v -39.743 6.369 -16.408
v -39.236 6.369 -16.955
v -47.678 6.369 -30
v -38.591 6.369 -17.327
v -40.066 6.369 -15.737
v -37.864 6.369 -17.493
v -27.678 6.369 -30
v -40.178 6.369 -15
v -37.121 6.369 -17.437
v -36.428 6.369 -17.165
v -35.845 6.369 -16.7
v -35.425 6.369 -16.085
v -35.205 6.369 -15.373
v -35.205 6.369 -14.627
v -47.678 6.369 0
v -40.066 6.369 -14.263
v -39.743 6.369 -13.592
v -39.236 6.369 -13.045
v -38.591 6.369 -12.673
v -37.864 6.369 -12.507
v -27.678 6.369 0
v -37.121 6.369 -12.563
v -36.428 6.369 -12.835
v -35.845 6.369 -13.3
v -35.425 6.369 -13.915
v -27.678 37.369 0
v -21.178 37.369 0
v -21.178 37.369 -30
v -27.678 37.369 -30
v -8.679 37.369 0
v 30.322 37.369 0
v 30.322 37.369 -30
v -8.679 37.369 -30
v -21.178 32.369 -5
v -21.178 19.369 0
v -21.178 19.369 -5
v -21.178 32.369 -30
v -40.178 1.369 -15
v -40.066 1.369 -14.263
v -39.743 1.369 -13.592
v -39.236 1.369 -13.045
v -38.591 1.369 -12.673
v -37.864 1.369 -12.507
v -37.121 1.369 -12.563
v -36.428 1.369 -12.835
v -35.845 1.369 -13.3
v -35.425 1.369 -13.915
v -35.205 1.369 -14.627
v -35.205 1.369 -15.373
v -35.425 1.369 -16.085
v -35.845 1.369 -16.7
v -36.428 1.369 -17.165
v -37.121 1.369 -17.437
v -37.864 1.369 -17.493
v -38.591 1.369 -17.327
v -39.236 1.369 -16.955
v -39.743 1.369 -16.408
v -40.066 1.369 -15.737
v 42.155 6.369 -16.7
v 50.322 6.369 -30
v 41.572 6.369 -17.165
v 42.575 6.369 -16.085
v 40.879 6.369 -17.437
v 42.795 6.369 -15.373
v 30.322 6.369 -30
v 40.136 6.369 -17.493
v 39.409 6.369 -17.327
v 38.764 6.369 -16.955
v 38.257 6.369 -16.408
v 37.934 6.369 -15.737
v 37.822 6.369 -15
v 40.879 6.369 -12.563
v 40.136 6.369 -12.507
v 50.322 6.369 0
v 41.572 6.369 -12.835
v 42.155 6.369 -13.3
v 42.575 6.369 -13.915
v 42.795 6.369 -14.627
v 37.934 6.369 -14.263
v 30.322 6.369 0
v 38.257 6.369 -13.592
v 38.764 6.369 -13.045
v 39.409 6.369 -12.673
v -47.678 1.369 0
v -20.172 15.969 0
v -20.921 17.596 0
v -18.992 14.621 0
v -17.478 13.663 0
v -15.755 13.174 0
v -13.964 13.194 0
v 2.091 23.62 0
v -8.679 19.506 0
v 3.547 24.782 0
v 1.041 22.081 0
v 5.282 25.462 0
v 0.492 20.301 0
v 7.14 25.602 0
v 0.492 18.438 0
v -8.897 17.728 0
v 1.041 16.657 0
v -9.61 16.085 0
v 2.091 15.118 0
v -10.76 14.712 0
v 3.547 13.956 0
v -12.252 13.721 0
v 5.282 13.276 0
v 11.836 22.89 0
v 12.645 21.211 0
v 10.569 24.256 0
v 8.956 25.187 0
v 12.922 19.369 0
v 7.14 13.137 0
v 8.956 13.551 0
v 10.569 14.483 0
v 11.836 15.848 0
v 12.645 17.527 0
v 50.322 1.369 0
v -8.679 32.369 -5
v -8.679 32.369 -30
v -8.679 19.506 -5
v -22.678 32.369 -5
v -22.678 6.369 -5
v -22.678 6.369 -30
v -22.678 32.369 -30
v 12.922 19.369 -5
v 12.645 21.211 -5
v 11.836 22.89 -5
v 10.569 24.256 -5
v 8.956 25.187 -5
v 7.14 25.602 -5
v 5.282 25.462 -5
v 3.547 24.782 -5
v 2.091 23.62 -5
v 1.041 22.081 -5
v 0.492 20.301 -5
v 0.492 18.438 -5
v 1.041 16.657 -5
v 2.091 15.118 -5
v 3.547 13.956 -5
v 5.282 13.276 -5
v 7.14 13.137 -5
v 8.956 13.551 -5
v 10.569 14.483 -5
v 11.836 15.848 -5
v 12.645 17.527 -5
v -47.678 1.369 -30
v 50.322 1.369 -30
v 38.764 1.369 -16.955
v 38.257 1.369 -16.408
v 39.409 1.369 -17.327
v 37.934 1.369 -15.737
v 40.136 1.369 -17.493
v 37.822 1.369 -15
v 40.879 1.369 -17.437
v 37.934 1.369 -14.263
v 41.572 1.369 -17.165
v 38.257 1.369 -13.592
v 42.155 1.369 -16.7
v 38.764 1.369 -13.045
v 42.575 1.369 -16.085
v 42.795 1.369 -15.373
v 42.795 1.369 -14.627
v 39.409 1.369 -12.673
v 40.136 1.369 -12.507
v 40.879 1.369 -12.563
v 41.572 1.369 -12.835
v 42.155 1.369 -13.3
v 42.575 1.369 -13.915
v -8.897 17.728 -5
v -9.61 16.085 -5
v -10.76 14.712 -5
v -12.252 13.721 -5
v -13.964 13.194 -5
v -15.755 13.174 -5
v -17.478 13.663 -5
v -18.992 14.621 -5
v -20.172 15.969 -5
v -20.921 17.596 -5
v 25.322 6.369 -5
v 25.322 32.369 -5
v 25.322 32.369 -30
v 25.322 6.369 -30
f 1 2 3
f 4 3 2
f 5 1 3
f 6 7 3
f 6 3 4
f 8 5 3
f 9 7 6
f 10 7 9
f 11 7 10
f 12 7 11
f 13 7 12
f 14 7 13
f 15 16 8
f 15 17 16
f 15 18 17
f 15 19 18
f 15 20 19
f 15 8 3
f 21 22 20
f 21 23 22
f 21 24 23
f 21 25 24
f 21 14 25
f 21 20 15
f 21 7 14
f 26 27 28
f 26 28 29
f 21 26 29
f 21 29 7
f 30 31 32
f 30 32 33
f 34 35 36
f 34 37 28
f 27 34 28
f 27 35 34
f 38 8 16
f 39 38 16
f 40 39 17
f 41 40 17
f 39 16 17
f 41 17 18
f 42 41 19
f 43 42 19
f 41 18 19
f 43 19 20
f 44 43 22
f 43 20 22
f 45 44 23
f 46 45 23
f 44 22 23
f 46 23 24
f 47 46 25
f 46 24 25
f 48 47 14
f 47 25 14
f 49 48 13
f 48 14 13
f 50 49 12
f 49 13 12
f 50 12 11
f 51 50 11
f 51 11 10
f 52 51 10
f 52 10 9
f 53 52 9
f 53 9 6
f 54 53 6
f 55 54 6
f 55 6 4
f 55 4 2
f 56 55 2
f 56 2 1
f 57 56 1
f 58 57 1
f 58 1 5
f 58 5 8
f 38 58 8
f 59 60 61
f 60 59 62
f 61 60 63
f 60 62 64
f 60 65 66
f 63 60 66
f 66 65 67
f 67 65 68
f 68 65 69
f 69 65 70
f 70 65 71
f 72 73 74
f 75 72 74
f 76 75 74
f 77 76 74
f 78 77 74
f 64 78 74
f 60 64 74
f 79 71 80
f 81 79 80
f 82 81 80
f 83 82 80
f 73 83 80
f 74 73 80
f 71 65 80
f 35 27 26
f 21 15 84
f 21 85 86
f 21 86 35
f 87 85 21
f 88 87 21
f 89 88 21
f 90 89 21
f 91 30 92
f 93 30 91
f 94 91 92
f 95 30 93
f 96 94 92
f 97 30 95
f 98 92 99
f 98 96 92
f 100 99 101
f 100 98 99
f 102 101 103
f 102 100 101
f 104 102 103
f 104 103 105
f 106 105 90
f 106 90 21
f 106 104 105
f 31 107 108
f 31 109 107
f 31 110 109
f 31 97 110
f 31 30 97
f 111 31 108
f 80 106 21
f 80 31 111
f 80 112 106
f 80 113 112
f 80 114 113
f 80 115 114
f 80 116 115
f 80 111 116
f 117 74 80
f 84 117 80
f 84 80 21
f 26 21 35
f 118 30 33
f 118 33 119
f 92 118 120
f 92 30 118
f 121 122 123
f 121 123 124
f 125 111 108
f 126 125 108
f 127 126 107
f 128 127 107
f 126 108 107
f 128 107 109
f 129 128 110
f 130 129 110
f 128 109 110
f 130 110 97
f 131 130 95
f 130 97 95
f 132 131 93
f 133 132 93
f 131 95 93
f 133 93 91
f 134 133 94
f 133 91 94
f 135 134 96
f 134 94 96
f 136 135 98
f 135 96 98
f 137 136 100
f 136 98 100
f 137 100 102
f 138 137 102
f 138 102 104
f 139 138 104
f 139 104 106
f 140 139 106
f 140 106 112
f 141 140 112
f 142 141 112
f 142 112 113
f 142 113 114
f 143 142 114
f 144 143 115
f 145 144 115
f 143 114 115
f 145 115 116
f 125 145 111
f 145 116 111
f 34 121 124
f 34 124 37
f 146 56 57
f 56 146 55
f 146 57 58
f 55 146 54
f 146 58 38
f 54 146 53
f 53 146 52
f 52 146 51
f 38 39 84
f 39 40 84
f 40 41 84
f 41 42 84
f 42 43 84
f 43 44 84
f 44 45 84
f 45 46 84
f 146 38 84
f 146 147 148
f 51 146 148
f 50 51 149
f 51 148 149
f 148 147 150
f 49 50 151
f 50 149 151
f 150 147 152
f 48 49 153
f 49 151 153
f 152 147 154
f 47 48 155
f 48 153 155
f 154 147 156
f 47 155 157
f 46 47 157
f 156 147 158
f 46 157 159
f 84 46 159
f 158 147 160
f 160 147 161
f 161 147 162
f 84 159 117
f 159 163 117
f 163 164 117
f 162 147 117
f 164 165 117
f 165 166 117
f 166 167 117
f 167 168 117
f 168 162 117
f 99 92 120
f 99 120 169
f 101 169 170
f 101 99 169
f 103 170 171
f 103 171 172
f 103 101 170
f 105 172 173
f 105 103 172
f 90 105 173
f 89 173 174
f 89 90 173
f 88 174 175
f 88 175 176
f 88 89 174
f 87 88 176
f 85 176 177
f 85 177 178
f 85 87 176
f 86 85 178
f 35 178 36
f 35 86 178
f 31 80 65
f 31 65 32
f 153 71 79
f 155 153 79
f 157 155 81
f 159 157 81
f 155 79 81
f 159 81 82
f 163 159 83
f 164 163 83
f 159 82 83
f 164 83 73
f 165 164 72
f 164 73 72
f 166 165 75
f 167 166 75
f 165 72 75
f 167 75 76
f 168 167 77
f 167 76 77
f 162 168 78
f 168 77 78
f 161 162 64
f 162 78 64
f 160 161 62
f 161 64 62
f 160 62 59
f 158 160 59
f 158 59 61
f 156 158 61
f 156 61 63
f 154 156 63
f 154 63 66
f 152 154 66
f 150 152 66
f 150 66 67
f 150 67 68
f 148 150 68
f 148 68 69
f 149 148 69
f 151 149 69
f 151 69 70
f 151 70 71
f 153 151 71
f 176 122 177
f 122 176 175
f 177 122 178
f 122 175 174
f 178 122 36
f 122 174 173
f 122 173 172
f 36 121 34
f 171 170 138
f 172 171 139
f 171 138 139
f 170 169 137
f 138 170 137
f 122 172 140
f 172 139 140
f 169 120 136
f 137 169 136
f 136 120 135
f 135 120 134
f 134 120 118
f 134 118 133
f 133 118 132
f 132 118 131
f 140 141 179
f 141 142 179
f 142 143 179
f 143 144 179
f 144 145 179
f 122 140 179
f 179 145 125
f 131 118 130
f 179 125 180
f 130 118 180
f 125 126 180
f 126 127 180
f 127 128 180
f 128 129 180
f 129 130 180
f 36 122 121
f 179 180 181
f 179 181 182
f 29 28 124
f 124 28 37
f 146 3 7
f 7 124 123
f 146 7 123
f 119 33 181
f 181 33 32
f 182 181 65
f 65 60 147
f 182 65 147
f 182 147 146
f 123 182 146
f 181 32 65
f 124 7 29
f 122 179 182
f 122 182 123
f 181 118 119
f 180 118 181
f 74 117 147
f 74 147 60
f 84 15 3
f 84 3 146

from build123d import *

# Parameters (mm, degrees)
F1_DEPTH = 30
F0_R     = 6.25
F2_DEPTH = 5
F3_W     = 5
F3_H     = 30
F4_DEPTH = 20
F5_W     = 5
F5_H     = 30
F6_DEPTH = 20
F7_R     = 2.5
F8_DEPTH = 25


# Not quite as in the source:
# - a feature names something its author has since deleted; it is built from what else it names


with BuildPart() as f1:
    # F0 (on Top) → F1 (new body)
    with BuildSketch(Plane.XY):
        Polygon((25.3224579843, 32.3690634753), (25.3224579843, 6.3690634753), (30.3224579843, 6.3690634753), (30.3224579843, 37.3690634753), (-8.6790506474, 37.3690634753), (-8.6790506474, 32.3690634753), align=None)
        Polygon((-22.6775420157, 6.3690634753), (-22.6775420157, 32.3690634753), (-21.1775420157, 32.3690634753), (-21.1775420157, 37.3690634753), (-27.6775420157, 37.3690634753), (-27.6775420157, 6.3690634753), align=None)
        Polygon((25.3224579843, 6.3690634753), (-22.6775420157, 6.3690634753), (-27.6775420157, 6.3690634753), (-27.6775420157, 1.3690634753), (30.3224579843, 1.3690634753), (30.3224579843, 6.3690634753), align=None)
    extrude(amount=-F1_DEPTH)

    # F0 (on Top) → F2 (join)
    with BuildSketch(Plane.XY):
        Polygon((-22.6775420157, 6.3690634753), (-22.6775420157, 32.3690634753), (-21.1775420157, 32.3690634753), (-21.1775420157, 37.3690634753), (-27.6775420157, 37.3690634753), (-27.6775420157, 6.3690634753), align=None)
        with BuildLine():
            Line((-21.1775420157, 32.3690634753), (-22.6775420157, 32.3690634753))
            Line((-22.6775420157, 32.3690634753), (-22.6775420157, 6.3690634753))
            Line((-22.6775420157, 6.3690634753), (25.3224579843, 6.3690634753))
            Line((25.3224579843, 6.3690634753), (25.3224579843, 32.3690634753))
            Line((25.3224579843, 32.3690634753), (-8.6790506474, 32.3690634753))
            Line((-8.6790506474, 32.3690634753), (-8.6790506474, 19.5063792474))
            ThreePointArc((-8.6790506474, 19.5063792474), (-14.858879986, 13.1194406446), (-21.1775420157, 19.3690634753))
            Line((-21.1775420157, 19.3690634753), (-21.1775420157, 32.3690634753))
        make_face()
        with Locations((6.6724579843, 19.3690634753)):
            Circle(F0_R, mode=Mode.SUBTRACT)
        Polygon((25.3224579843, 6.3690634753), (-22.6775420157, 6.3690634753), (-27.6775420157, 6.3690634753), (-27.6775420157, 1.3690634753), (30.3224579843, 1.3690634753), (30.3224579843, 6.3690634753), align=None)
        Polygon((25.3224579843, 32.3690634753), (25.3224579843, 6.3690634753), (30.3224579843, 6.3690634753), (30.3224579843, 37.3690634753), (-8.6790506474, 37.3690634753), (-8.6790506474, 32.3690634753), align=None)
    extrude(amount=-F2_DEPTH)

    # F3 (on face) → F4 (join)
    with BuildSketch(Plane.YZ.offset(30.3224579843)):
        with Locations((3.8690634753, -15)):
            Rectangle(F3_W, F3_H)
    extrude(amount=F4_DEPTH)

    # F5 (on face) → F6 (join)
    with BuildSketch(Plane(origin=(-27.6775420157, 0, 0), x_dir=(0, -1, 0), z_dir=(-1, 0, 0))):
        with Locations((-3.8690634753, -15)):
            Rectangle(F5_W, F5_H)
    extrude(amount=F6_DEPTH)

    # F7 (on face) → F8 (cut)
    with BuildSketch(Plane(origin=(0, 6.3690634753, 0), x_dir=(-1, 0, 0), z_dir=(0, 1, 0))):
        with Locations((-40.3224579843, -15)):
            Circle(F7_R)
        with Locations((37.6775420157, -15)):
            Circle(F7_R)
    extrude(amount=-F8_DEPTH, mode=Mode.SUBTRACT)


solid = f1.part
